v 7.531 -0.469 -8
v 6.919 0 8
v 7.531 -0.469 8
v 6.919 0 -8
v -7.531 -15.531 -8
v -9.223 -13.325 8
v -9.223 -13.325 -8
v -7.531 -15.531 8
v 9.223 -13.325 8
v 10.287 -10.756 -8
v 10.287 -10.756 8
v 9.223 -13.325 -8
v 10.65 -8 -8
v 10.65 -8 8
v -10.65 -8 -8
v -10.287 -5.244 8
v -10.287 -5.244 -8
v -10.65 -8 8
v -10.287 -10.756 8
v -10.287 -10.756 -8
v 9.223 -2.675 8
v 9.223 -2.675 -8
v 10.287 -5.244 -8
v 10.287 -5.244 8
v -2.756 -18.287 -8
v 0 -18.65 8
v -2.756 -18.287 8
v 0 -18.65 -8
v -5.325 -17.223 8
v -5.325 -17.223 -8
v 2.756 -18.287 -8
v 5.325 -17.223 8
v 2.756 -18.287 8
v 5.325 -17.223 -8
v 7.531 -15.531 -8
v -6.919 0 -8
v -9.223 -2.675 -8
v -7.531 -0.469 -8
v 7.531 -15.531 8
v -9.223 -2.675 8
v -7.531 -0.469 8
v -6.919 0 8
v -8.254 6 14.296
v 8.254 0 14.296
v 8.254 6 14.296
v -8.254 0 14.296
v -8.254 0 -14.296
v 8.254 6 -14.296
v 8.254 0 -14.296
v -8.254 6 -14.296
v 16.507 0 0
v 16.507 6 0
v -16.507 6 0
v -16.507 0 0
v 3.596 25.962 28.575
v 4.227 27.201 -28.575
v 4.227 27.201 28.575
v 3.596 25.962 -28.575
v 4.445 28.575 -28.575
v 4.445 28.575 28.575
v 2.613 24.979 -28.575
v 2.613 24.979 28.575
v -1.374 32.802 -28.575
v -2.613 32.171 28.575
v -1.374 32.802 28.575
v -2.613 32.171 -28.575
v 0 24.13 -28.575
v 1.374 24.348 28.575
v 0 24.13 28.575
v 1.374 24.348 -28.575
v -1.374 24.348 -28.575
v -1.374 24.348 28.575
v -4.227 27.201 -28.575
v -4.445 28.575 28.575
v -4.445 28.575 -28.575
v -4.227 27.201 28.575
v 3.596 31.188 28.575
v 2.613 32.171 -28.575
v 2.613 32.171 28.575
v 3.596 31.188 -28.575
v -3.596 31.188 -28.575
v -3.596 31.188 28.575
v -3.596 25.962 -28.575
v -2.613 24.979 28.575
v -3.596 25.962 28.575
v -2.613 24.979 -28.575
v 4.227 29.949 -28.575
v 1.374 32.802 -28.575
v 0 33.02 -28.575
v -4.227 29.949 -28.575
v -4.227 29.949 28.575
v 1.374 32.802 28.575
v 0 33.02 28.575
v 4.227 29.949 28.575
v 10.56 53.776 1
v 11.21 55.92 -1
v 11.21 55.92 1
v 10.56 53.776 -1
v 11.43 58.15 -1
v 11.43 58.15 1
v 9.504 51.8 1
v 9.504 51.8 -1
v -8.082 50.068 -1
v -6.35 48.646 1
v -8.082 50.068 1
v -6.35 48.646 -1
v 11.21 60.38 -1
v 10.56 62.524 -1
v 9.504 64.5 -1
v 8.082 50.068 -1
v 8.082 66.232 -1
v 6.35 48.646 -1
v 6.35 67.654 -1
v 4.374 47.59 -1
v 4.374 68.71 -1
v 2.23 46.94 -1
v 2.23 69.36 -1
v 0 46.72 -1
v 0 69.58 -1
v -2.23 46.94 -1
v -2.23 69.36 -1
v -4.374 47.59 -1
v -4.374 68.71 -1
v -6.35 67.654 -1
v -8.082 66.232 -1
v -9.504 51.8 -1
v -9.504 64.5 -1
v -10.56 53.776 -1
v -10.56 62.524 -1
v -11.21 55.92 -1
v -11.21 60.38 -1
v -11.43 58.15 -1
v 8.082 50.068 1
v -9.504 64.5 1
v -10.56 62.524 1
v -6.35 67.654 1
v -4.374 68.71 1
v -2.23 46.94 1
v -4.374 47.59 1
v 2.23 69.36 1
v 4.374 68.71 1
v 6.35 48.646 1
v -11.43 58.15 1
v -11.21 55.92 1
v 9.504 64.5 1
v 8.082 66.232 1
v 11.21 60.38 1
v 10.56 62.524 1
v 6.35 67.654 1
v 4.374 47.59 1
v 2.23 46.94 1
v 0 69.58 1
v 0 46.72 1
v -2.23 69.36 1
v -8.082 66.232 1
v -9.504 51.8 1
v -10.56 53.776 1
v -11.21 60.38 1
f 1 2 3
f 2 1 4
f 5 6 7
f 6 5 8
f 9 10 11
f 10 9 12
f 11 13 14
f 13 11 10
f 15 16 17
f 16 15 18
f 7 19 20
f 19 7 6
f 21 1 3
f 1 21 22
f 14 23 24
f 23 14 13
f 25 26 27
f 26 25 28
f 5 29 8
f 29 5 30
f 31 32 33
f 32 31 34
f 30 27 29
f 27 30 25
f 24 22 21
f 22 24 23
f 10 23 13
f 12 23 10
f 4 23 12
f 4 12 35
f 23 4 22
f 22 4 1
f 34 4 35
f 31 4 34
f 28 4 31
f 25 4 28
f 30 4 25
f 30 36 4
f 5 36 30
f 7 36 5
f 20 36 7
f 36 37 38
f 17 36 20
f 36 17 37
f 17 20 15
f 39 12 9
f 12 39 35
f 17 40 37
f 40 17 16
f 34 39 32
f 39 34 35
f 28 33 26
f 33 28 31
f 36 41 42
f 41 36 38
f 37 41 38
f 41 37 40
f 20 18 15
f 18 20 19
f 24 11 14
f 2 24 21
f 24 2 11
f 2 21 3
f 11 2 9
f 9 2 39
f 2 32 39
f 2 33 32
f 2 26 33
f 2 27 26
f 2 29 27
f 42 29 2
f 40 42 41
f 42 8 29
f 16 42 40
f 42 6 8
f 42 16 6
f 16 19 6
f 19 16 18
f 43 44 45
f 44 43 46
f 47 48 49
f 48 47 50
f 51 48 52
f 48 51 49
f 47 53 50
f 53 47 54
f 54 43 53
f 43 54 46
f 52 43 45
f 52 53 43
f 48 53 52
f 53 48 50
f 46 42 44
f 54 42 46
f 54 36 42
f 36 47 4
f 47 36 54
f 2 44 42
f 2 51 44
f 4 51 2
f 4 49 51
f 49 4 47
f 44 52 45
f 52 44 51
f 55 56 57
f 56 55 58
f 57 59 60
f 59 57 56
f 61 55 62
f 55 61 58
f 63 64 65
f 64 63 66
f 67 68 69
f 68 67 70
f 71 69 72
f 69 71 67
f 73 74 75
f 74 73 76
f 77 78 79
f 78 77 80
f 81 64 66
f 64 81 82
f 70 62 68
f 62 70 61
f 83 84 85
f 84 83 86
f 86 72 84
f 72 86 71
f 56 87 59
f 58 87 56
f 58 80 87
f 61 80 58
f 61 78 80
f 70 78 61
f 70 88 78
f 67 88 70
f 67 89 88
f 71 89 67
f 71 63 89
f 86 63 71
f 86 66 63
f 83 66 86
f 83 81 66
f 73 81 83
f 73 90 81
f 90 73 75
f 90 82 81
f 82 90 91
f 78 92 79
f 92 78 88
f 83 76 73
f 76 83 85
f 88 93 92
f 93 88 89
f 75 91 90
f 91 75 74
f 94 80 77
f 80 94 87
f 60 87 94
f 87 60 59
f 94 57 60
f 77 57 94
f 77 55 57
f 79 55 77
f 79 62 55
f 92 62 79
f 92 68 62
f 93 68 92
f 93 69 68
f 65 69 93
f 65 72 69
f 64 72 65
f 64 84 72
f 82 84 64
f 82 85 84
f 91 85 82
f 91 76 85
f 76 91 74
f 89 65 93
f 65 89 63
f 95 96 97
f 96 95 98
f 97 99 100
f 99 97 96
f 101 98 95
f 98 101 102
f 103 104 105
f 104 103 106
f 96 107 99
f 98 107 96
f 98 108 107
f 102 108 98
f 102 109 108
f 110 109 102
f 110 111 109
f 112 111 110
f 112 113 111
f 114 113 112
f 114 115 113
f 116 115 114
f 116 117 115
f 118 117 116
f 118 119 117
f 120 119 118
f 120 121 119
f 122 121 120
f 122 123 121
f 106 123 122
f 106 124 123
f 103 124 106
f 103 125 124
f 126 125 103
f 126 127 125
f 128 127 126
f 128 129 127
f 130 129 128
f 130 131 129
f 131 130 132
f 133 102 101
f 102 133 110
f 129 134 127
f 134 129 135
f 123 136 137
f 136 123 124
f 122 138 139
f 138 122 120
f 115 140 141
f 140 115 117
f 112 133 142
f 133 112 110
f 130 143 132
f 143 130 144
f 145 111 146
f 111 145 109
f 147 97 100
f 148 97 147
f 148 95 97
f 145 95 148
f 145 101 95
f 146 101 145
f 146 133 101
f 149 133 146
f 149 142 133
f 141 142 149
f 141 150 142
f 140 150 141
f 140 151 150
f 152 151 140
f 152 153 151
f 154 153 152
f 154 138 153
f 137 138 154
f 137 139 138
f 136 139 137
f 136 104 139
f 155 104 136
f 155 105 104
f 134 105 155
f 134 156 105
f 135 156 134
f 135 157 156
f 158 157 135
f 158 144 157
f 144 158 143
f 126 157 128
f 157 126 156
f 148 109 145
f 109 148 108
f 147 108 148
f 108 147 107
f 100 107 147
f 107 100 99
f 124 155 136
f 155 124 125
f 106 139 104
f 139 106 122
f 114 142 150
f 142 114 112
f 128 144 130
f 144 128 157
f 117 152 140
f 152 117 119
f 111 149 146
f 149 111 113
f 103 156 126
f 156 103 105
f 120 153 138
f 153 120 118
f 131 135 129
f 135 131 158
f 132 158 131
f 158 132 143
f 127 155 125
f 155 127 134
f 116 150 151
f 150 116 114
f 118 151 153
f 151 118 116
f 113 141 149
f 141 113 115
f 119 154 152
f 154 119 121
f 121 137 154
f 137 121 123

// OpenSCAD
// Auto-generated by scripts/author_from_manifest.py (Phase D.3).
// Source: data/phase_d_manifest.json (sku_intent='reliable-f156-upright-135f').
// Do not hand-edit — regenerate from the manifest.
//
// @part reliable_f156_upright_135f
// @kind sprinkler_head
// @category head.upright.k56
// @display-name "Reliable F1-56 Upright K5.6 SR 135°F"
// @mfg reliable_automatic_sprinkler
// @mfg-pn F1-56
// @listing UL FM
// @hazard-classes LH OH1
// @price-usd 12.75
// @install-minutes 8
// @crew journeyman
// @k-factor 5.6
// @orientation upright
// @response standard
// @temperature 135F
// @param size_in number default=0.5 label="Size" unit="in"
// @port inlet position=[0,0.014,0] direction=[0,1,0] style=NPT_threaded size_in=0.5 role=drop

size_in = 0.5;
k_factor = 5.6;

length_mm   = 57.15;
body_dia_mm = 25.40;
thread_od   = 21.3;
thread_len  = 16;
deflector_d = body_dia_mm * 0.9;

rotate([180,0,0]) union() {
    translate([0, thread_len/2, 0])
        cylinder(h = thread_len, d = thread_od, center = true, $fn = 24);
    translate([0, -3, 0])
        rotate([90, 0, 0])
        cylinder(h = 6, d = thread_od * 1.55, $fn = 6, center = true);
    translate([0, -length_mm/2, 0])
        cylinder(h = length_mm, d = body_dia_mm * 0.35, center = true, $fn = 20);
    translate([0, -length_mm - 1, 0])
        cylinder(h = 2, d = deflector_d, center = true, $fn = 32);
}
